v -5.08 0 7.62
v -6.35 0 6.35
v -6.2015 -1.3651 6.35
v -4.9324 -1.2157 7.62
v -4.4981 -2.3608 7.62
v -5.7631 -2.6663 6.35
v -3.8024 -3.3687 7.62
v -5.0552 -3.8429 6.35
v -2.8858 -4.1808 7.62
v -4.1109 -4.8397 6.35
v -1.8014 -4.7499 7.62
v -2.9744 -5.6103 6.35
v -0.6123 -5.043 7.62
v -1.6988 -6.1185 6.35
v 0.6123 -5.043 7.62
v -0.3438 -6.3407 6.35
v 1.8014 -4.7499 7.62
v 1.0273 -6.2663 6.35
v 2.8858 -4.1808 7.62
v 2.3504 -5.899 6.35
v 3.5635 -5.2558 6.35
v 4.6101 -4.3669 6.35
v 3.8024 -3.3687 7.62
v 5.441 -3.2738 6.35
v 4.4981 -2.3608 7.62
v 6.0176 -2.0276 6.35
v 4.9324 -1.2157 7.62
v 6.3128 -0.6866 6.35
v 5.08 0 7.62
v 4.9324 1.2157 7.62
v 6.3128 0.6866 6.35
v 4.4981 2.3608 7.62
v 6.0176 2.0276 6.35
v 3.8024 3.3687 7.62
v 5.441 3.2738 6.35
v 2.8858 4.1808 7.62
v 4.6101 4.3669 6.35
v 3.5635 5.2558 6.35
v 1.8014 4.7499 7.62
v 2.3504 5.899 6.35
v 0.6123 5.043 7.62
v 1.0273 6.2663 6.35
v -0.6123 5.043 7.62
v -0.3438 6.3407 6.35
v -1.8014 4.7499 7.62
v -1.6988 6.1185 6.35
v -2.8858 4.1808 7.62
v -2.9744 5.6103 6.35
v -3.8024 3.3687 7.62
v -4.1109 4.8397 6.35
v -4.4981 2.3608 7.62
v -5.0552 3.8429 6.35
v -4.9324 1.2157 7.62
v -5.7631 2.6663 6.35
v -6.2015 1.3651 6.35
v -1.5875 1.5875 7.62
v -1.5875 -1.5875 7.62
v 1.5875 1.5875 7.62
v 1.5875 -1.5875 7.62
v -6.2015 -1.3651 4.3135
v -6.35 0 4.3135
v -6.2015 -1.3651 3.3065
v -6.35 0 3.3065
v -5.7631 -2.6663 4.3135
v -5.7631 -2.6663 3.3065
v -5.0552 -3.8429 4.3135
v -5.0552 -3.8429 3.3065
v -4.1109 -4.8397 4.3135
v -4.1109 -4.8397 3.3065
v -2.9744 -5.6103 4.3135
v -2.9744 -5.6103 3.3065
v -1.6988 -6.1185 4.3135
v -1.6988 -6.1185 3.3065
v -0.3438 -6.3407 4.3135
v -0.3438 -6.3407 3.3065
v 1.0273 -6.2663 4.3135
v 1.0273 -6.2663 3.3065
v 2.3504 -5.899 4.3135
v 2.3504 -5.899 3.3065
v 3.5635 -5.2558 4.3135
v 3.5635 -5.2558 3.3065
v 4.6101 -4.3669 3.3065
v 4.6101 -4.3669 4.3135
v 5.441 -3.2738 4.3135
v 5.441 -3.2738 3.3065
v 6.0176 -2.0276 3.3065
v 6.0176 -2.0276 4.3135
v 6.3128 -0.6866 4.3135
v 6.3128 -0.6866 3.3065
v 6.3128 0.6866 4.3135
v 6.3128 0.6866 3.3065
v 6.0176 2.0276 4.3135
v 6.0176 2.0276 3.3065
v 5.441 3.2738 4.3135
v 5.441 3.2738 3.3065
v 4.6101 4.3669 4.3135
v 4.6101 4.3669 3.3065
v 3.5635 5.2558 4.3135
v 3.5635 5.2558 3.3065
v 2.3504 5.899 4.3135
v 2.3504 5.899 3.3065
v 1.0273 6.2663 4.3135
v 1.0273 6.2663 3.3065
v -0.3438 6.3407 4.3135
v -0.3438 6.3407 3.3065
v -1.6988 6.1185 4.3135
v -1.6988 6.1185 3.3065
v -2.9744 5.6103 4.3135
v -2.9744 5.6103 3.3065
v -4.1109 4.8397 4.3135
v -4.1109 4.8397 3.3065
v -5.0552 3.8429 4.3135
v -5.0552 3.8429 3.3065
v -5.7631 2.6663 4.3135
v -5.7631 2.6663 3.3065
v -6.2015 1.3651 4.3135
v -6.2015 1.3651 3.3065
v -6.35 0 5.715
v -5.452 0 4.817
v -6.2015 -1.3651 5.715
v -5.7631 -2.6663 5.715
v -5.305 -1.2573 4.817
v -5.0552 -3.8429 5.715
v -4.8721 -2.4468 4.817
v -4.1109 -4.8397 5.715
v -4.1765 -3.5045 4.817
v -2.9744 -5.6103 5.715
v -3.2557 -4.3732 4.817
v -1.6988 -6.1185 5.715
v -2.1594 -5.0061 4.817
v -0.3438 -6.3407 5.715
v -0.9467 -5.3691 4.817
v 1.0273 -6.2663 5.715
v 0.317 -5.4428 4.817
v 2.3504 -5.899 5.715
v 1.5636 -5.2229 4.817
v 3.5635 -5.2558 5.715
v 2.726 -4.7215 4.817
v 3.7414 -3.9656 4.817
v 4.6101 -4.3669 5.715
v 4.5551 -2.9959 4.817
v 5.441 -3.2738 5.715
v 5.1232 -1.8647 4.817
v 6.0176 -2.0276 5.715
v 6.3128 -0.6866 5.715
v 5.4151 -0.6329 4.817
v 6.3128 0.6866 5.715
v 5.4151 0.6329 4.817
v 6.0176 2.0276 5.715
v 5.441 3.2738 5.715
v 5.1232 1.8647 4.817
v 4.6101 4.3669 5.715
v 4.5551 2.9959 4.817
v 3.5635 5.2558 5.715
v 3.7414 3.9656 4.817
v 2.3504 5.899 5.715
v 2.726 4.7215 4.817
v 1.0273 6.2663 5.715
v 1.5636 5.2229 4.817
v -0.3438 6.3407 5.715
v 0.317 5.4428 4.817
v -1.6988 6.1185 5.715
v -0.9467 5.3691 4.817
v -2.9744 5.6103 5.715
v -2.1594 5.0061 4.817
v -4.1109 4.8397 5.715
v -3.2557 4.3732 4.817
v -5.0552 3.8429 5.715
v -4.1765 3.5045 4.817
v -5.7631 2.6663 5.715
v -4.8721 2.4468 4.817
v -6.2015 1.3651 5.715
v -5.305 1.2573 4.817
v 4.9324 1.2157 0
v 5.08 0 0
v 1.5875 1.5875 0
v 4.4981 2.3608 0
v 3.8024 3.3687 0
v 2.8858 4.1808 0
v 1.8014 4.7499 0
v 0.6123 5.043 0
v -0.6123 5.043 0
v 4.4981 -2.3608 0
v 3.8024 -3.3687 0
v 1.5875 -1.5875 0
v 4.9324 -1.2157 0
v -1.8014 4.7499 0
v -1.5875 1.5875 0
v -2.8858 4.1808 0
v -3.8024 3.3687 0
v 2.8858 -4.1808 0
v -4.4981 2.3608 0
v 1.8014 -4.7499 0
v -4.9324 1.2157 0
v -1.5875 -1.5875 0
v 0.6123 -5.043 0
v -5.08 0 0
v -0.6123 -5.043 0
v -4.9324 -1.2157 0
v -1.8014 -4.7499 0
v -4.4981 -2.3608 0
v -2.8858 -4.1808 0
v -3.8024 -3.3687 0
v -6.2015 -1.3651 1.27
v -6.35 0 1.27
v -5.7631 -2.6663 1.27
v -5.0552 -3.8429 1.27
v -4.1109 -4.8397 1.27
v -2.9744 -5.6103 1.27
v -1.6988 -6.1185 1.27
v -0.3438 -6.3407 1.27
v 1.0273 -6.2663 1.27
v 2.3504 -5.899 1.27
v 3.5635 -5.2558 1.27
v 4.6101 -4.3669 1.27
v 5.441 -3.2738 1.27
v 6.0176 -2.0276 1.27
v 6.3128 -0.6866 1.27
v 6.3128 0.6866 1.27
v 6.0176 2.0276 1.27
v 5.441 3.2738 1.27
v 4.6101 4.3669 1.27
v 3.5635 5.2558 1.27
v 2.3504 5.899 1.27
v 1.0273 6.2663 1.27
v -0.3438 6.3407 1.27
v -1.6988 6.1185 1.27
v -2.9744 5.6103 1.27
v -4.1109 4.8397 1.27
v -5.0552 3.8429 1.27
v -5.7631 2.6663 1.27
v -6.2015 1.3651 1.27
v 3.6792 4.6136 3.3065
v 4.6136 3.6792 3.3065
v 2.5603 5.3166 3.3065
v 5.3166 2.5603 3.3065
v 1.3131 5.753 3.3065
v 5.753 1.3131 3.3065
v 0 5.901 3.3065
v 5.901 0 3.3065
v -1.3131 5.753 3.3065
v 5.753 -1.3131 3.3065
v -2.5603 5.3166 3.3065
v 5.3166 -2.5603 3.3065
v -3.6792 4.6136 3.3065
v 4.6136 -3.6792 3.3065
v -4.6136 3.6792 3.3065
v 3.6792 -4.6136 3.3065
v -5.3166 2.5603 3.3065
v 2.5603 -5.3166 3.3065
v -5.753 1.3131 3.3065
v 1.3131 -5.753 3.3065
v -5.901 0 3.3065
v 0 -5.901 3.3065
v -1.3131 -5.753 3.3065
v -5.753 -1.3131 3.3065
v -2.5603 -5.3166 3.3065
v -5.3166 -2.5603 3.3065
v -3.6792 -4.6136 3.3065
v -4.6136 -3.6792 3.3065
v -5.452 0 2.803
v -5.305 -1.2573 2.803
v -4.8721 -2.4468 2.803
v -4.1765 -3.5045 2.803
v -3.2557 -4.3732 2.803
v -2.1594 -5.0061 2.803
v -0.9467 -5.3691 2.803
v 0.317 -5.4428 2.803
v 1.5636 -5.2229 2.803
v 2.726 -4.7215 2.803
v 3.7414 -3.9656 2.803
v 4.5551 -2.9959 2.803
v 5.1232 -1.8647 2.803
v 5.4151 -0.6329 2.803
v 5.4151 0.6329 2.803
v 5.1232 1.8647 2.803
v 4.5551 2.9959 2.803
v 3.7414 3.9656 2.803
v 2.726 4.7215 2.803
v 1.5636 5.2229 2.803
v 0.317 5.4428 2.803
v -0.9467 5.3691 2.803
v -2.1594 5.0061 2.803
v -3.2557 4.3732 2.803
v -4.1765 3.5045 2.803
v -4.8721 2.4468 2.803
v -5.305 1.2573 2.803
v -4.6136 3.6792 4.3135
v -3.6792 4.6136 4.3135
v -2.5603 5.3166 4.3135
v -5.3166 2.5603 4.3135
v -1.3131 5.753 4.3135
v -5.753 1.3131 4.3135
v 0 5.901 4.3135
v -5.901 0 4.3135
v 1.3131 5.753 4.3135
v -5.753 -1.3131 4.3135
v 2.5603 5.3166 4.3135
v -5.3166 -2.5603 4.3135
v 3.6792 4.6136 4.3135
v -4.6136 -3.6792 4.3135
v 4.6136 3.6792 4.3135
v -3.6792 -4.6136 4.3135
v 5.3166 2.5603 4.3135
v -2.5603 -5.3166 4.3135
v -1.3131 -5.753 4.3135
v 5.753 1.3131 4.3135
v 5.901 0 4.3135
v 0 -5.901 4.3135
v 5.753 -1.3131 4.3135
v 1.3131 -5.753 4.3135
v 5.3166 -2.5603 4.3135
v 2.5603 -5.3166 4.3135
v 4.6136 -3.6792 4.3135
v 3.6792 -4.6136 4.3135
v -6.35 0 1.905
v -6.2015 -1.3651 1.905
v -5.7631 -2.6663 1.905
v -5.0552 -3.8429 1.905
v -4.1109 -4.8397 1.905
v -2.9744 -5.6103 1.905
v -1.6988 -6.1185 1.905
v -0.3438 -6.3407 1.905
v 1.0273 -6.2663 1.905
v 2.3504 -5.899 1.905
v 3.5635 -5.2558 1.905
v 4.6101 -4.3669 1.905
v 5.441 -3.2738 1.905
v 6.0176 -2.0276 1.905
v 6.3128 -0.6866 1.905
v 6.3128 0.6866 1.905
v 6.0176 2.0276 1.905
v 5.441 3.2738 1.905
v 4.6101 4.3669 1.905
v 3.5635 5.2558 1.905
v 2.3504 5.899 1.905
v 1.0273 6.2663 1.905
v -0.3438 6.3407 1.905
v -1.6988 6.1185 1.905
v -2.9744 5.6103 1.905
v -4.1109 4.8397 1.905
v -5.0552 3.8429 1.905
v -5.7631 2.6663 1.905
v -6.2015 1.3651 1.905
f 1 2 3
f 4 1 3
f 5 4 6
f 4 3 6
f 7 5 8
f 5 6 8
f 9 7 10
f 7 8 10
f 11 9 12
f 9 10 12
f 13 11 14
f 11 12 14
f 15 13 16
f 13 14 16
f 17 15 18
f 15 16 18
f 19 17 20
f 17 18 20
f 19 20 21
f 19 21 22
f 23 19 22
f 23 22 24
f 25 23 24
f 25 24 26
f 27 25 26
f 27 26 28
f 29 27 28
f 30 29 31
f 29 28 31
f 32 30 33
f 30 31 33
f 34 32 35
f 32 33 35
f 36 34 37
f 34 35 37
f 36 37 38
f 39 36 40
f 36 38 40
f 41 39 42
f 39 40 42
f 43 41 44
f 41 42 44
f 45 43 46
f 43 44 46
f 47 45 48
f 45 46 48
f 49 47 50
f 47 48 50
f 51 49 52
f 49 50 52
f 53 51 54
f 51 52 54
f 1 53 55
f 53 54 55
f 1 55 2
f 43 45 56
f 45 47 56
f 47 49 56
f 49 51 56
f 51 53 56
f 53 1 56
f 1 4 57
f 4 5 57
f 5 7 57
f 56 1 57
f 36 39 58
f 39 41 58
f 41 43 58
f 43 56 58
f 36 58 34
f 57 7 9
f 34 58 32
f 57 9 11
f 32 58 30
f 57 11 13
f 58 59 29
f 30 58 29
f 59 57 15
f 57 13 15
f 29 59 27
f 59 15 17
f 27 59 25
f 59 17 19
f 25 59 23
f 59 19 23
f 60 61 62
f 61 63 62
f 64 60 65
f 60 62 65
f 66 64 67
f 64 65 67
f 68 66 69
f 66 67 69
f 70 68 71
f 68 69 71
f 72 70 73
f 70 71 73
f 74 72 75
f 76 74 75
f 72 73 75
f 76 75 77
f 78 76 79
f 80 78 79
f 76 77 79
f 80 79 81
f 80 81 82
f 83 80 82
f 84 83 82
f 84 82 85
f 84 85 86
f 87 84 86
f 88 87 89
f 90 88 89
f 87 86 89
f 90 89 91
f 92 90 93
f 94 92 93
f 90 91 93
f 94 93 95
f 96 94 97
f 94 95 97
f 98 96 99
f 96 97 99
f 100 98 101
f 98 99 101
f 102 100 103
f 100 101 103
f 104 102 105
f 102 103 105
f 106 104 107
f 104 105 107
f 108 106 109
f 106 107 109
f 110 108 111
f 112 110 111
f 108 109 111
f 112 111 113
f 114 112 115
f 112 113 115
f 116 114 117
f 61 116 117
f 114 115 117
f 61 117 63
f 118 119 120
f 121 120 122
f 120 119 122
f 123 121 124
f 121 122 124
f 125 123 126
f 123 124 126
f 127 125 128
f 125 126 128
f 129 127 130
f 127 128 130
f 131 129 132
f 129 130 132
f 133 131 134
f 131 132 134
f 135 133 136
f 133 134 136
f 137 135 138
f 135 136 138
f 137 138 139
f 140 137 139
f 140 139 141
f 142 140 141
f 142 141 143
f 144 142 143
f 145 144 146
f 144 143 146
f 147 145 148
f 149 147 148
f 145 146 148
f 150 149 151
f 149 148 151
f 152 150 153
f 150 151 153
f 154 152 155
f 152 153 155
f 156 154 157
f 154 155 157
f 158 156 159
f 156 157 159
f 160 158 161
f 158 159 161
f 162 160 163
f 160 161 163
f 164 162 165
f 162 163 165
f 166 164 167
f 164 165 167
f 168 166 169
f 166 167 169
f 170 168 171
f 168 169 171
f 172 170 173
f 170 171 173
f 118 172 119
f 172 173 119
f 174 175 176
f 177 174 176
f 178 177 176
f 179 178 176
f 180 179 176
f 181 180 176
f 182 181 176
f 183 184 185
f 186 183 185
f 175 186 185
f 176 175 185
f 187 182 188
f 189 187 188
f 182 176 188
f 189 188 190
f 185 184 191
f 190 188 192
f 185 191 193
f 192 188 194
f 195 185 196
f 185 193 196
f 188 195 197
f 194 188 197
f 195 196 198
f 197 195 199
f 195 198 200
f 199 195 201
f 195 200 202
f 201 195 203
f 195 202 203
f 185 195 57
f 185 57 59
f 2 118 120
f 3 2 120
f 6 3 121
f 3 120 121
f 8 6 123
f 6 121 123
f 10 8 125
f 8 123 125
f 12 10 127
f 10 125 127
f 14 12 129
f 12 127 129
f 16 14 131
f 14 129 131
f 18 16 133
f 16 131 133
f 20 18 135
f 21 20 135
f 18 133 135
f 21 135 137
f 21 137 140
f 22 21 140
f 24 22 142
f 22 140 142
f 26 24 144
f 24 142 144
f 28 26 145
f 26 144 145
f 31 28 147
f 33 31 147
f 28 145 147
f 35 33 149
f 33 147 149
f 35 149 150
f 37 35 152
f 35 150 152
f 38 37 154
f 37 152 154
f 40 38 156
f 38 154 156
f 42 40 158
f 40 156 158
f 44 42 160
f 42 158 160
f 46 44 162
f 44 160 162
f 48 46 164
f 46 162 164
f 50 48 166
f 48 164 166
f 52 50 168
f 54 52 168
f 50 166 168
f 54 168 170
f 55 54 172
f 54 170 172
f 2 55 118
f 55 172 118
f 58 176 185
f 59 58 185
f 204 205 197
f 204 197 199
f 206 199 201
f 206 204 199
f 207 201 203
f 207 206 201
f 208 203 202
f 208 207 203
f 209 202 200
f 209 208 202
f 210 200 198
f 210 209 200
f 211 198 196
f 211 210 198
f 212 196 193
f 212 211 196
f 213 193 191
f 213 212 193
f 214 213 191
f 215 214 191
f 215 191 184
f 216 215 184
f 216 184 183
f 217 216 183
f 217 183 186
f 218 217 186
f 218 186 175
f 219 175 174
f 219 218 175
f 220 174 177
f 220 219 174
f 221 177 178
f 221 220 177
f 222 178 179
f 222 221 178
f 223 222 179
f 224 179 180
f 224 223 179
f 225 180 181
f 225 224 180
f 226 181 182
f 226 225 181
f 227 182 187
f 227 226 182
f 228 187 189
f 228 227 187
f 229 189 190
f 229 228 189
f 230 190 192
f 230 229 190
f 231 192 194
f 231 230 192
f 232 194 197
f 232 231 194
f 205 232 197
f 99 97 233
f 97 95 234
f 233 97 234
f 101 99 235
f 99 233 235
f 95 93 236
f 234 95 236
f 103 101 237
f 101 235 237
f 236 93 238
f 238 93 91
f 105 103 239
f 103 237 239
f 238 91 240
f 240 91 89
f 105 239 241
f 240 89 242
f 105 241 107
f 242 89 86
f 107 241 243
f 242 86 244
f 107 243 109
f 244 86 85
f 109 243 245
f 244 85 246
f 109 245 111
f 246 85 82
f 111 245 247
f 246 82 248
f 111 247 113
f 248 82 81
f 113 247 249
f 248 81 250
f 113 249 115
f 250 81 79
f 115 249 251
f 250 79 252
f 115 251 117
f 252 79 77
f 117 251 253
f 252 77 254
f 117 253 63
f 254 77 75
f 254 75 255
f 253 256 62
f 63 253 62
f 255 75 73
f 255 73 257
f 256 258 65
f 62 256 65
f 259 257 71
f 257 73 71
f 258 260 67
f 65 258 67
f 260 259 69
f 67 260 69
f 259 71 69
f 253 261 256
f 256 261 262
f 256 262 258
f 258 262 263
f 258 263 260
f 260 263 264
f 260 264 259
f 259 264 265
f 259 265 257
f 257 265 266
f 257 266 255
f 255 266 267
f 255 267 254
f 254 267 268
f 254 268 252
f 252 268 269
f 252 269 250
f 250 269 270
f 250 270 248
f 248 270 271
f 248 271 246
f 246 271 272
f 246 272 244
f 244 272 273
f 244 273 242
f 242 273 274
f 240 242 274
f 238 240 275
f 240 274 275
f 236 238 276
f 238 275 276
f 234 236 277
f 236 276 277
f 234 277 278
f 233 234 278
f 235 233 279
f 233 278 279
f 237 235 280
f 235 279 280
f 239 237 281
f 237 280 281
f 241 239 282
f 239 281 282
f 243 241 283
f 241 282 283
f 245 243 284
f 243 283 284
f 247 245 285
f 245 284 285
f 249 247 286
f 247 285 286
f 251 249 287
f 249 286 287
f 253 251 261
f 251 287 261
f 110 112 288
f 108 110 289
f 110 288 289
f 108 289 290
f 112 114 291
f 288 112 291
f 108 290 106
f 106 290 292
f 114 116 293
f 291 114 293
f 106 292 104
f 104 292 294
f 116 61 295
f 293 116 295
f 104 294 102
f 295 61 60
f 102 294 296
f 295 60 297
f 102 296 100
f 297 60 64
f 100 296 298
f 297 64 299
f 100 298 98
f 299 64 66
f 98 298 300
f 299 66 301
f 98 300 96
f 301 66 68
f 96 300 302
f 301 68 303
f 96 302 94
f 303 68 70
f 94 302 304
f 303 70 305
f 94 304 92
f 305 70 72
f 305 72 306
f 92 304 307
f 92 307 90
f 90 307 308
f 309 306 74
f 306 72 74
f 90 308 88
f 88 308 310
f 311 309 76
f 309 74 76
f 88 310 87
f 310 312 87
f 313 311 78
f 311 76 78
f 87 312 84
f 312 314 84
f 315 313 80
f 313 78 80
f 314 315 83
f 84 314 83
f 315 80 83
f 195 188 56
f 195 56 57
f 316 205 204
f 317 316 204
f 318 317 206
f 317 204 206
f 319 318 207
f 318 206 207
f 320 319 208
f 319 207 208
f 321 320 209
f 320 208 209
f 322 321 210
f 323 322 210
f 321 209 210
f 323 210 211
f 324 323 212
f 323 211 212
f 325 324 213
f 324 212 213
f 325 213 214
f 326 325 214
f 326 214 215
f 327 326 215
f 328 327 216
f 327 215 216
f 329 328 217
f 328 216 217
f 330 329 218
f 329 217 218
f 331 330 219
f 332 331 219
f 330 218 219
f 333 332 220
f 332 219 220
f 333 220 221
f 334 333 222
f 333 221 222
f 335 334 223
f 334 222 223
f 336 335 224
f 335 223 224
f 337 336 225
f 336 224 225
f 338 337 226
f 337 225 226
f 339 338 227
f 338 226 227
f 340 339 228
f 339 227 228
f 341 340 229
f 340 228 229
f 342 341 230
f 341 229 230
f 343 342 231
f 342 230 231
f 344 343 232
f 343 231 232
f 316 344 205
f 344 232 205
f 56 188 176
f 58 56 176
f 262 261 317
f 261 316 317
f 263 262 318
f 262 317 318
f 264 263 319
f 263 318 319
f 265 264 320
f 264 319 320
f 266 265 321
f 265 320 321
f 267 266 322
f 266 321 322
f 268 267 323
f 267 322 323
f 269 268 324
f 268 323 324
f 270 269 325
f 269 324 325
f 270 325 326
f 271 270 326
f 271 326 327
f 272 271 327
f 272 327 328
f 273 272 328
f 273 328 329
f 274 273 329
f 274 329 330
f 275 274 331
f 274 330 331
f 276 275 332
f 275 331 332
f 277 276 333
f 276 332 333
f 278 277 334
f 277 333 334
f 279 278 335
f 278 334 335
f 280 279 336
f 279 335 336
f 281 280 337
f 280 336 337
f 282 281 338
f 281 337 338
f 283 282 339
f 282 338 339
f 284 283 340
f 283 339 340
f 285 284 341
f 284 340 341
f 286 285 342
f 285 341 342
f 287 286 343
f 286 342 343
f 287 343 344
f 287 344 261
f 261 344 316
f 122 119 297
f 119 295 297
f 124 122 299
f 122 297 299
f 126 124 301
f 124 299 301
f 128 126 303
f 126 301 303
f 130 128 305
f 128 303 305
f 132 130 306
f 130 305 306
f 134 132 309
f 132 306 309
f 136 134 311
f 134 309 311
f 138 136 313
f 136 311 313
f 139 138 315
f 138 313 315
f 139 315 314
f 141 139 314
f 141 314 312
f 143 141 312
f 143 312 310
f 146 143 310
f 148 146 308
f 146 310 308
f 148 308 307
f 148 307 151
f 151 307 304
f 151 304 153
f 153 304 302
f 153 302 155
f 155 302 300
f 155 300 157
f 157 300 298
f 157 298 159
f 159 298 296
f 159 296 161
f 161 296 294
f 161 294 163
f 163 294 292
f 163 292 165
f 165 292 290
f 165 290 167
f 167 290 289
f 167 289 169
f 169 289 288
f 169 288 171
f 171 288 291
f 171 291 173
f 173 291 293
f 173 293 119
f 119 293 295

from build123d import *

# Parameters (mm, degrees)
F2_SIZE  = 1.27
F3_W     = 3.175
F3_H     = 3.175
F4_DEPTH = 25.4


with BuildPart() as f1:
    # F0 (on Front) → F1 (revolve)
    with BuildSketch(Plane.XZ):
        Polygon((-6.35, 0), (0, 0), (0, 7.62), (-6.35, 7.62), (-6.35, 5.715), (-5.451974, 4.816974), (-5.900987, 4.313487), (-6.35, 4.313487), (-6.35, 3.306513), (-5.900987, 3.306513), (-5.451974, 2.803026), (-6.35, 1.905), align=None)
    revolve(axis=Axis((0, 0, 3.81), (0, 0, 1)))

    # F2
    f2_edges = [f1.edges().sort_by_distance(p)[0] for p in [
        (6.35, 0, 7.62),
        (6.35, 0, 0),
    ]]
    chamfer(f2_edges, length=F2_SIZE)

    # F3 (on face) → F4 (cut)
    with BuildSketch(Plane(origin=(0, 0, 0), x_dir=(1, 0, 0), z_dir=(0, 0, -1))):
        Rectangle(F3_W, F3_H)
    extrude(amount=-F4_DEPTH, mode=Mode.SUBTRACT)


solid = f1.part
